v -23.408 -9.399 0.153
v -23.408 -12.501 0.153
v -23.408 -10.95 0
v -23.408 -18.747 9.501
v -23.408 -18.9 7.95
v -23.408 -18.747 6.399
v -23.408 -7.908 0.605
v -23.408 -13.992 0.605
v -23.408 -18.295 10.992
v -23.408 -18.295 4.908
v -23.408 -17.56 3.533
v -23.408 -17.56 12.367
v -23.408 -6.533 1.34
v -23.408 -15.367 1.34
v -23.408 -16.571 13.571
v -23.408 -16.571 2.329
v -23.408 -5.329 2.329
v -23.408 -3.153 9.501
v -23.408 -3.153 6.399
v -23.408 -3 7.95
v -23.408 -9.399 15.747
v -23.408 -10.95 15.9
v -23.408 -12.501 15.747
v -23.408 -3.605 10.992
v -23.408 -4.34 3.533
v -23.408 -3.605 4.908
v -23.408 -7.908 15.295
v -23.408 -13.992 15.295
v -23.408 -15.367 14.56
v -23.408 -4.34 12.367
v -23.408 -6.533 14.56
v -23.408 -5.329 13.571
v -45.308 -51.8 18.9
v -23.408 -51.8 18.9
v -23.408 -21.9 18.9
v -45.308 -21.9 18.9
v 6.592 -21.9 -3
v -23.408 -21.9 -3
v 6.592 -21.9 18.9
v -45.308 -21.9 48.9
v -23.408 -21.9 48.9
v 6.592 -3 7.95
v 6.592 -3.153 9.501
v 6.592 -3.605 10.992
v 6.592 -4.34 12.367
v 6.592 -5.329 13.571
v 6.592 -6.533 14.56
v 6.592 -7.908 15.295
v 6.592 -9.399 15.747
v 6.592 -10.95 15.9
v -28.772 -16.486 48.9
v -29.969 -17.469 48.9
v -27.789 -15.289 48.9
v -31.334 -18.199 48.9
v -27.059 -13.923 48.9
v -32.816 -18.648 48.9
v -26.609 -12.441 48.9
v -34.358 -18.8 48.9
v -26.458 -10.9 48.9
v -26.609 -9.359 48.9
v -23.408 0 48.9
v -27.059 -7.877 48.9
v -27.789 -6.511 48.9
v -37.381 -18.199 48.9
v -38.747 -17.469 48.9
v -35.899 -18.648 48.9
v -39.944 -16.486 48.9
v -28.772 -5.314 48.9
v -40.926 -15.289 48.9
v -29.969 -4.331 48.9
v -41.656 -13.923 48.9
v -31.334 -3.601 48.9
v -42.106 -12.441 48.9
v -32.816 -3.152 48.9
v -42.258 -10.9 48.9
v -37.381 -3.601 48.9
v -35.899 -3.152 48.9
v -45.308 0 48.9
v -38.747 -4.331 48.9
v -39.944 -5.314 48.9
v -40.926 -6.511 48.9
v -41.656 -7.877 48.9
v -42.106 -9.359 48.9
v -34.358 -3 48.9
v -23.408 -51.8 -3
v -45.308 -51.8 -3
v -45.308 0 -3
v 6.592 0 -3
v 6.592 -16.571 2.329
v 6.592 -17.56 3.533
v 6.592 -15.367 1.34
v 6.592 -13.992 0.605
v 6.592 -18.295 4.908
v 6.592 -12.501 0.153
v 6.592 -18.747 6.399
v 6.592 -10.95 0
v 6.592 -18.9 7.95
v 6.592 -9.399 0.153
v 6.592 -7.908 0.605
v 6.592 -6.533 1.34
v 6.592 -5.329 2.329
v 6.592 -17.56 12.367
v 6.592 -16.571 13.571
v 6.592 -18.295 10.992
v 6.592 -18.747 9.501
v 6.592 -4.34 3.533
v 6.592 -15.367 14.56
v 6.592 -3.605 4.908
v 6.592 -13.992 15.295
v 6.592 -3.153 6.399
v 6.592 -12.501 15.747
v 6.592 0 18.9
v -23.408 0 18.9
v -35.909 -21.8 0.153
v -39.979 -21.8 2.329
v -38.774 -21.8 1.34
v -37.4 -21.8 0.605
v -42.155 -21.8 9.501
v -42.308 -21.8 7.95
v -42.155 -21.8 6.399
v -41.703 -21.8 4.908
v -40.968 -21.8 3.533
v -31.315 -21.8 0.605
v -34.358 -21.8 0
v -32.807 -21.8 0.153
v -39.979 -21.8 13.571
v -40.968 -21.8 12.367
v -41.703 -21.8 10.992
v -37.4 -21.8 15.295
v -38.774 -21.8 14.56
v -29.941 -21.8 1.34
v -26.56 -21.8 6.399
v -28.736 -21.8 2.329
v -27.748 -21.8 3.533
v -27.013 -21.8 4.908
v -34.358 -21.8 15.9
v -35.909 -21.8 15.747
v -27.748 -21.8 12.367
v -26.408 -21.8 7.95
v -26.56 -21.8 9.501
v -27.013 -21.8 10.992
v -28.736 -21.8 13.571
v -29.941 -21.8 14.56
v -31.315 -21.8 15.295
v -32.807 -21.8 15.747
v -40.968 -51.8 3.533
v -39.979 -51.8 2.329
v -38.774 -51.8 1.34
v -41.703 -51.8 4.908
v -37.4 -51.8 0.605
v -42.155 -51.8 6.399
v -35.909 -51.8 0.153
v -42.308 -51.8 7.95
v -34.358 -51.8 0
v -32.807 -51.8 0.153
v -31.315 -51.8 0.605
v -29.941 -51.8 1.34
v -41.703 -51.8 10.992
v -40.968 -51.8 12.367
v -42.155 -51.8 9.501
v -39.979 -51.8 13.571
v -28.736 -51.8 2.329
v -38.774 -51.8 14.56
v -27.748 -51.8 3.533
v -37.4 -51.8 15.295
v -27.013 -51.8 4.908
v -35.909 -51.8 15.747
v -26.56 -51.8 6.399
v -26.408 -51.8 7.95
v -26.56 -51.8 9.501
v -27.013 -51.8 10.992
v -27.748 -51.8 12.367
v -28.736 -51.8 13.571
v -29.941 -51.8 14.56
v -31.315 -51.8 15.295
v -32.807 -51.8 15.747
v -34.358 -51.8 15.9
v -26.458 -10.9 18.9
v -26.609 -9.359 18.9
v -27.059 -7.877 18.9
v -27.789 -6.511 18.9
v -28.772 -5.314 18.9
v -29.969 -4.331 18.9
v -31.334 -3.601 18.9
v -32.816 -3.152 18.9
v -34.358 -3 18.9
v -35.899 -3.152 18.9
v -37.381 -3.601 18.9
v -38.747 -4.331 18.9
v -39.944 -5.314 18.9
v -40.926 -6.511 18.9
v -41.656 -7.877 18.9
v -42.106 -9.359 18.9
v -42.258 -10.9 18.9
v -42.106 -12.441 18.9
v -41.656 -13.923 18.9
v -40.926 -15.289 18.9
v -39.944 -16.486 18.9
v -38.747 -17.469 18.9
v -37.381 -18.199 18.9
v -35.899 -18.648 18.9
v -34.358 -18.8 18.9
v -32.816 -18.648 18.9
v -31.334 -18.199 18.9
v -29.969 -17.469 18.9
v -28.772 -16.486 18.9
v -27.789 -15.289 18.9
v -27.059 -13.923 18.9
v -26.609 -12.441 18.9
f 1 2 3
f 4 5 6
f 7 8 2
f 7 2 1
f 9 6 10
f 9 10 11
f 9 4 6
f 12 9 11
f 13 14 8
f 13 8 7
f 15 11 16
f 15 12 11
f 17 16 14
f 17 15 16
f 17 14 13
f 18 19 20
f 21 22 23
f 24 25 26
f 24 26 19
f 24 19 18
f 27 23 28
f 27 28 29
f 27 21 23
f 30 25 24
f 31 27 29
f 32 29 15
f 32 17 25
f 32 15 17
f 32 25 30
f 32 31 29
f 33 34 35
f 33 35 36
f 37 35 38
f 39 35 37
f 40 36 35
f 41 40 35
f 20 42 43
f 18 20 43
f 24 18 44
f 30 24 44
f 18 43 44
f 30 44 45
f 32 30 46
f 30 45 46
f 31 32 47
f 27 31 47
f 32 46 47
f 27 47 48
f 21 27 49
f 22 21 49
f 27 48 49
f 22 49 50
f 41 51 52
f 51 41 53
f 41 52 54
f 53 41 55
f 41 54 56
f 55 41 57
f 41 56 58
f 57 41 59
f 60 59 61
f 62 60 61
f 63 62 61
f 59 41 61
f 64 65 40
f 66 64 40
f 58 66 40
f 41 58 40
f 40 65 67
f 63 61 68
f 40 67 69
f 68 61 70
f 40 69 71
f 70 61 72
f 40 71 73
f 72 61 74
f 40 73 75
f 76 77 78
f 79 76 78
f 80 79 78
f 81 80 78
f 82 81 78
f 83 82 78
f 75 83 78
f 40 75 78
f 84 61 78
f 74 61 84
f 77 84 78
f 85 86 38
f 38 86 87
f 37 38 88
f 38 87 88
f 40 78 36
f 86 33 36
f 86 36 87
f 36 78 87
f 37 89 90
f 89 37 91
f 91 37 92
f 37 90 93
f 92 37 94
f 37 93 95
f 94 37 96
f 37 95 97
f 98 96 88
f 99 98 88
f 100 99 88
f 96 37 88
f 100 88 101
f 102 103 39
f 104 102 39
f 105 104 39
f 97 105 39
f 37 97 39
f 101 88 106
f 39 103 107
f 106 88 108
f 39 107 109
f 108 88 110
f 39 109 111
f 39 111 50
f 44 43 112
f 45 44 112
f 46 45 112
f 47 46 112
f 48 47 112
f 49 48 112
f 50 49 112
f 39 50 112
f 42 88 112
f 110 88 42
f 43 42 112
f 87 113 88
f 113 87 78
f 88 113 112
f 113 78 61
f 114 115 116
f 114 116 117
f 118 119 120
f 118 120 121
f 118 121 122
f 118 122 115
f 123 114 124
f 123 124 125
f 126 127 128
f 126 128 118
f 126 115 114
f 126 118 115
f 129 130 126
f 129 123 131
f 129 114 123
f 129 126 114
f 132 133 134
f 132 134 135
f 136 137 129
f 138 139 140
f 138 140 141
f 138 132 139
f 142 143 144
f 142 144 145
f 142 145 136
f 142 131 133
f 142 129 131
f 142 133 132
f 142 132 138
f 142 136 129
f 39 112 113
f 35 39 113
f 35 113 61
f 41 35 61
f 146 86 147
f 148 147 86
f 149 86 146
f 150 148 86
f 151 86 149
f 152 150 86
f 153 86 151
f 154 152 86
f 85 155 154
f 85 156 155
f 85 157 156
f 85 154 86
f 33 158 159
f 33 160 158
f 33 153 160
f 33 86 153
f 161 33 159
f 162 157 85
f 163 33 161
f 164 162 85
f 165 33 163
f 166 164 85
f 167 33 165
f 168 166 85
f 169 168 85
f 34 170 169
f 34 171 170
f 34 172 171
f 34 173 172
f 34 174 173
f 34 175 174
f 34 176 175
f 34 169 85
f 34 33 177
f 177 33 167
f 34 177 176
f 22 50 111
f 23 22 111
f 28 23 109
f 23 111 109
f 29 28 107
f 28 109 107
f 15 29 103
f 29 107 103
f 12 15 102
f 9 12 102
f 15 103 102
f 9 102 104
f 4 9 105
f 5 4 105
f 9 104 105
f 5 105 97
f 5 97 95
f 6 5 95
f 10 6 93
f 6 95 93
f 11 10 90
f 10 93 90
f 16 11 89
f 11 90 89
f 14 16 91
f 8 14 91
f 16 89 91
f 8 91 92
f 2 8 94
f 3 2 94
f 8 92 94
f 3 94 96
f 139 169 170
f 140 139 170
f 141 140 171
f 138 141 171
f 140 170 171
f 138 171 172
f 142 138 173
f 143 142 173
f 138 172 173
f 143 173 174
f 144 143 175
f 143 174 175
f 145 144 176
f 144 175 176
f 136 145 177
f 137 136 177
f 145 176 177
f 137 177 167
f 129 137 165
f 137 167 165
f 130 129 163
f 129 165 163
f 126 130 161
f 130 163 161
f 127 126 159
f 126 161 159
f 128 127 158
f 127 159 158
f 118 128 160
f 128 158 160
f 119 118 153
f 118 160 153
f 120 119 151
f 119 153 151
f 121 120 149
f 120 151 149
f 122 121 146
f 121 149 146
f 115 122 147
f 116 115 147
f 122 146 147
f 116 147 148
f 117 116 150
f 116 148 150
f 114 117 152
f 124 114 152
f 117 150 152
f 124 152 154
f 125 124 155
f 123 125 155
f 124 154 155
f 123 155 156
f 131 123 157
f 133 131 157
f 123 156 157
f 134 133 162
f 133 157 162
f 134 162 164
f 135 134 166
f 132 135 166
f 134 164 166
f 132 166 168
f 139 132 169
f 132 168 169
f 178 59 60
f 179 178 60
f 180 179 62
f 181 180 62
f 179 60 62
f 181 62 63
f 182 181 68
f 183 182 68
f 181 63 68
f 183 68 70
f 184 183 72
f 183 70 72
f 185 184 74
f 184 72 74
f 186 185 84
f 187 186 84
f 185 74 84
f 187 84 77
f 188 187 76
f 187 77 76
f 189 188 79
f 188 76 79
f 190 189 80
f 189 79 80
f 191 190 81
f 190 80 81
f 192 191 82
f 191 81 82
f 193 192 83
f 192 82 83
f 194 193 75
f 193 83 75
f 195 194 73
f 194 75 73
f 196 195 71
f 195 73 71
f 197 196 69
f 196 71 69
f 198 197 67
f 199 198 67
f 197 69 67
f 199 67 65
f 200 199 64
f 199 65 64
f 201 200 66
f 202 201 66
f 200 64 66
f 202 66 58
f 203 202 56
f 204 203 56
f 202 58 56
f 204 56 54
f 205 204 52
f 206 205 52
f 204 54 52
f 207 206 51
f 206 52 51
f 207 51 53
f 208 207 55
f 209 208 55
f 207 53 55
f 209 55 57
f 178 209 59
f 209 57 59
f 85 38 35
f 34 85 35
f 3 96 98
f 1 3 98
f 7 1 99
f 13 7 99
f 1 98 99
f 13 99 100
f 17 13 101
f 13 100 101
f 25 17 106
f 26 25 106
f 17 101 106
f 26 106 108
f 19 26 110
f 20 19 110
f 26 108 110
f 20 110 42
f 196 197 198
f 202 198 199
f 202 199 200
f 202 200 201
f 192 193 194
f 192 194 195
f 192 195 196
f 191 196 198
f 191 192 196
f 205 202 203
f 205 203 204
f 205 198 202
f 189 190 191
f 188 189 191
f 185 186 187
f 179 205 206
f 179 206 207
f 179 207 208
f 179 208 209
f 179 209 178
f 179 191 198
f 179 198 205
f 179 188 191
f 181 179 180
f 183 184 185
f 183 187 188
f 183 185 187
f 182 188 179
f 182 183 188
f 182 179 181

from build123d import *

# Parameters (mm, degrees)
F0_W     = 27
F0_H     = 15.9
F0_W_2   = 15.9
F0_H_2   = 27
F0_W_3   = 3
F0_H_3   = 3
F1_DEPTH = 21.9
F2_DEPTH = 51.8
F3_R     = 7.95
F6_DEPTH = 30
F7_DEPTH = 30
F4_R     = 7.9
F8_DEPTH = 30


with BuildPart() as f1:
    # F0 (on Front) → F1 (new body)
    with BuildSketch(Plane.XZ):
        with BuildLine():
            Line((-34.3576915575, 15.9), (-42.3076915575, 15.9))
            Line((-42.3076915575, 15.9), (-42.3076915575, 7.9499999931))
            ThreePointArc((-42.3076915575, 7.9499999931), (-39.9791904704, 13.571498908), (-34.3576915575, 15.9))
        make_face()
        with BuildLine():
            ThreePointArc((-34.3576915575, 15.9), (-39.9791904704, 13.571498908), (-42.3076915575, 7.9499999931))
            ThreePointArc((-42.3076915575, 7.9499999931), (-39.9791904655, 2.3285010871), (-34.3576915575, 0))
            ThreePointArc((-34.3576915575, 0), (-28.7361926471, 2.3285010896), (-26.4076915575, 7.95))
            ThreePointArc((-26.4076915575, 7.95), (-28.7361926471, 13.5714989104), (-34.3576915575, 15.9))
        make_face()
        Polygon((-42.3076915575, 18.9), (-42.3076915575, 45.9), (-26.4076915575, 45.9), (-26.4076915575, 18.9), (-23.4076915575, 18.9), (-23.4076915575, 48.9), (-45.3076915575, 48.9), (-45.3076915575, 18.9), align=None)
        with Locations((-9.9076915575, 7.95)):
            Rectangle(F0_W, F0_H)
        with Locations((-34.3576915575, 32.4)):
            Rectangle(F0_W_2, F0_H_2)
        with BuildLine():
            ThreePointArc((-34.3576915575, 0), (-39.9791904655, 2.3285010871), (-42.3076915575, 7.9499999931))
            Line((-42.3076915575, 7.9499999931), (-42.3076915575, 0))
            Line((-42.3076915575, 0), (-34.3576915575, 0))
        make_face()
        with BuildLine():
            Line((-26.4076915575, 0), (-26.4076915575, 7.95))
            ThreePointArc((-26.4076915575, 7.95), (-28.7361926471, 2.3285010896), (-34.3576915575, 0))
            Line((-34.3576915575, 0), (-26.4076915575, 0))
        make_face()
        with BuildLine():
            Line((-26.4076915575, 7.95), (-26.4076915575, 15.9))
            Line((-26.4076915575, 15.9), (-34.3576915575, 15.9))
            ThreePointArc((-34.3576915575, 15.9), (-28.7361926471, 13.5714989104), (-26.4076915575, 7.95))
        make_face()
        Polygon((6.5923084425, 18.9), (-23.4076915575, 18.9), (-23.4076915575, 15.9), (3.5923084425, 15.9), (3.5923084425, 0), (-23.4076915575, 0), (-23.4076915575, -3), (6.5923084425, -3), align=None)
        Polygon((-26.4076915575, 18.9), (-42.3076915575, 18.9), (-42.3076915575, 15.9), (-34.3576915575, 15.9), (-26.4076915575, 15.9), align=None)
        Polygon((-23.4076915575, 15.9), (-26.4076915575, 15.9), (-26.4076915575, 7.95), (-26.4076915575, 0), (-23.4076915575, 0), align=None)
        Polygon((-42.3076915575, 15.9), (-42.3076915575, 18.9), (-45.3076915575, 18.9), (-45.3076915575, -3), (-23.4076915575, -3), (-23.4076915575, 0), (-26.4076915575, 0), (-34.3576915575, 0), (-42.3076915575, 0), (-42.3076915575, 7.9499999931), align=None)
        with Locations((-24.9076915575, 17.4)):
            Rectangle(F0_W_3, F0_H_3)
    extrude(amount=F1_DEPTH)

    # F0 (on Front) → F2 (join)
    with BuildSketch(Plane.XZ):
        Polygon((-42.3076915575, 15.9), (-42.3076915575, 18.9), (-45.3076915575, 18.9), (-45.3076915575, -3), (-23.4076915575, -3), (-23.4076915575, 0), (-26.4076915575, 0), (-34.3576915575, 0), (-42.3076915575, 0), (-42.3076915575, 7.9499999931), align=None)
        with BuildLine():
            ThreePointArc((-34.3576915575, 15.9), (-39.9791904704, 13.571498908), (-42.3076915575, 7.9499999931))
            ThreePointArc((-42.3076915575, 7.9499999931), (-39.9791904655, 2.3285010871), (-34.3576915575, 0))
            ThreePointArc((-34.3576915575, 0), (-28.7361926471, 2.3285010896), (-26.4076915575, 7.95))
            ThreePointArc((-26.4076915575, 7.95), (-28.7361926471, 13.5714989104), (-34.3576915575, 15.9))
        make_face()
        Polygon((-26.4076915575, 18.9), (-42.3076915575, 18.9), (-42.3076915575, 15.9), (-34.3576915575, 15.9), (-26.4076915575, 15.9), align=None)
        Polygon((-23.4076915575, 15.9), (-26.4076915575, 15.9), (-26.4076915575, 7.95), (-26.4076915575, 0), (-23.4076915575, 0), align=None)
        with Locations((-24.9076915575, 17.4)):
            Rectangle(F0_W_3, F0_H_3)
        with BuildLine():
            Line((-26.4076915575, 7.95), (-26.4076915575, 15.9))
            Line((-26.4076915575, 15.9), (-34.3576915575, 15.9))
            ThreePointArc((-34.3576915575, 15.9), (-28.7361926471, 13.5714989104), (-26.4076915575, 7.95))
        make_face()
        with BuildLine():
            Line((-34.3576915575, 15.9), (-42.3076915575, 15.9))
            Line((-42.3076915575, 15.9), (-42.3076915575, 7.9499999931))
            ThreePointArc((-42.3076915575, 7.9499999931), (-39.9791904704, 13.571498908), (-34.3576915575, 15.9))
        make_face()
        with BuildLine():
            ThreePointArc((-34.3576915575, 0), (-39.9791904655, 2.3285010871), (-42.3076915575, 7.9499999931))
            Line((-42.3076915575, 7.9499999931), (-42.3076915575, 0))
            Line((-42.3076915575, 0), (-34.3576915575, 0))
        make_face()
        with BuildLine():
            Line((-26.4076915575, 0), (-26.4076915575, 7.95))
            ThreePointArc((-26.4076915575, 7.95), (-28.7361926471, 2.3285010896), (-34.3576915575, 0))
            Line((-34.3576915575, 0), (-26.4076915575, 0))
        make_face()
    extrude(amount=F2_DEPTH)

    # F3 (on face) → F6 (cut)
    with BuildSketch(Plane.XZ.offset(51.8)):
        with Locations((-34.3576915575, 7.95)):
            Circle(F3_R)
    extrude(amount=-F6_DEPTH, mode=Mode.SUBTRACT)

    # F5 (on face) → F7 (cut)
    with BuildSketch(Plane.YZ.offset(6.5923084425)):
        with BuildLine():
            ThreePointArc((-3, 7.95), (-5.3285010896, 13.5714989104), (-10.95, 15.9))
            ThreePointArc((-10.95, 15.9), (-16.5714989104, 13.5714989104), (-18.9, 7.95))
            ThreePointArc((-18.9, 7.95), (-16.5714989104, 2.3285010896), (-10.95, 0))
            ThreePointArc((-10.95, 0), (-5.3285010896, 2.3285010896), (-3, 7.95))
        make_face()
    extrude(amount=-F7_DEPTH, mode=Mode.SUBTRACT)

    # F4 (on face) → F8 (cut)
    with BuildSketch(Plane.XY.offset(48.9)):
        with Locations((-34.3576915575, -10.9)):
            Circle(F4_R)
    extrude(amount=-F8_DEPTH, mode=Mode.SUBTRACT)


solid = f1.part
